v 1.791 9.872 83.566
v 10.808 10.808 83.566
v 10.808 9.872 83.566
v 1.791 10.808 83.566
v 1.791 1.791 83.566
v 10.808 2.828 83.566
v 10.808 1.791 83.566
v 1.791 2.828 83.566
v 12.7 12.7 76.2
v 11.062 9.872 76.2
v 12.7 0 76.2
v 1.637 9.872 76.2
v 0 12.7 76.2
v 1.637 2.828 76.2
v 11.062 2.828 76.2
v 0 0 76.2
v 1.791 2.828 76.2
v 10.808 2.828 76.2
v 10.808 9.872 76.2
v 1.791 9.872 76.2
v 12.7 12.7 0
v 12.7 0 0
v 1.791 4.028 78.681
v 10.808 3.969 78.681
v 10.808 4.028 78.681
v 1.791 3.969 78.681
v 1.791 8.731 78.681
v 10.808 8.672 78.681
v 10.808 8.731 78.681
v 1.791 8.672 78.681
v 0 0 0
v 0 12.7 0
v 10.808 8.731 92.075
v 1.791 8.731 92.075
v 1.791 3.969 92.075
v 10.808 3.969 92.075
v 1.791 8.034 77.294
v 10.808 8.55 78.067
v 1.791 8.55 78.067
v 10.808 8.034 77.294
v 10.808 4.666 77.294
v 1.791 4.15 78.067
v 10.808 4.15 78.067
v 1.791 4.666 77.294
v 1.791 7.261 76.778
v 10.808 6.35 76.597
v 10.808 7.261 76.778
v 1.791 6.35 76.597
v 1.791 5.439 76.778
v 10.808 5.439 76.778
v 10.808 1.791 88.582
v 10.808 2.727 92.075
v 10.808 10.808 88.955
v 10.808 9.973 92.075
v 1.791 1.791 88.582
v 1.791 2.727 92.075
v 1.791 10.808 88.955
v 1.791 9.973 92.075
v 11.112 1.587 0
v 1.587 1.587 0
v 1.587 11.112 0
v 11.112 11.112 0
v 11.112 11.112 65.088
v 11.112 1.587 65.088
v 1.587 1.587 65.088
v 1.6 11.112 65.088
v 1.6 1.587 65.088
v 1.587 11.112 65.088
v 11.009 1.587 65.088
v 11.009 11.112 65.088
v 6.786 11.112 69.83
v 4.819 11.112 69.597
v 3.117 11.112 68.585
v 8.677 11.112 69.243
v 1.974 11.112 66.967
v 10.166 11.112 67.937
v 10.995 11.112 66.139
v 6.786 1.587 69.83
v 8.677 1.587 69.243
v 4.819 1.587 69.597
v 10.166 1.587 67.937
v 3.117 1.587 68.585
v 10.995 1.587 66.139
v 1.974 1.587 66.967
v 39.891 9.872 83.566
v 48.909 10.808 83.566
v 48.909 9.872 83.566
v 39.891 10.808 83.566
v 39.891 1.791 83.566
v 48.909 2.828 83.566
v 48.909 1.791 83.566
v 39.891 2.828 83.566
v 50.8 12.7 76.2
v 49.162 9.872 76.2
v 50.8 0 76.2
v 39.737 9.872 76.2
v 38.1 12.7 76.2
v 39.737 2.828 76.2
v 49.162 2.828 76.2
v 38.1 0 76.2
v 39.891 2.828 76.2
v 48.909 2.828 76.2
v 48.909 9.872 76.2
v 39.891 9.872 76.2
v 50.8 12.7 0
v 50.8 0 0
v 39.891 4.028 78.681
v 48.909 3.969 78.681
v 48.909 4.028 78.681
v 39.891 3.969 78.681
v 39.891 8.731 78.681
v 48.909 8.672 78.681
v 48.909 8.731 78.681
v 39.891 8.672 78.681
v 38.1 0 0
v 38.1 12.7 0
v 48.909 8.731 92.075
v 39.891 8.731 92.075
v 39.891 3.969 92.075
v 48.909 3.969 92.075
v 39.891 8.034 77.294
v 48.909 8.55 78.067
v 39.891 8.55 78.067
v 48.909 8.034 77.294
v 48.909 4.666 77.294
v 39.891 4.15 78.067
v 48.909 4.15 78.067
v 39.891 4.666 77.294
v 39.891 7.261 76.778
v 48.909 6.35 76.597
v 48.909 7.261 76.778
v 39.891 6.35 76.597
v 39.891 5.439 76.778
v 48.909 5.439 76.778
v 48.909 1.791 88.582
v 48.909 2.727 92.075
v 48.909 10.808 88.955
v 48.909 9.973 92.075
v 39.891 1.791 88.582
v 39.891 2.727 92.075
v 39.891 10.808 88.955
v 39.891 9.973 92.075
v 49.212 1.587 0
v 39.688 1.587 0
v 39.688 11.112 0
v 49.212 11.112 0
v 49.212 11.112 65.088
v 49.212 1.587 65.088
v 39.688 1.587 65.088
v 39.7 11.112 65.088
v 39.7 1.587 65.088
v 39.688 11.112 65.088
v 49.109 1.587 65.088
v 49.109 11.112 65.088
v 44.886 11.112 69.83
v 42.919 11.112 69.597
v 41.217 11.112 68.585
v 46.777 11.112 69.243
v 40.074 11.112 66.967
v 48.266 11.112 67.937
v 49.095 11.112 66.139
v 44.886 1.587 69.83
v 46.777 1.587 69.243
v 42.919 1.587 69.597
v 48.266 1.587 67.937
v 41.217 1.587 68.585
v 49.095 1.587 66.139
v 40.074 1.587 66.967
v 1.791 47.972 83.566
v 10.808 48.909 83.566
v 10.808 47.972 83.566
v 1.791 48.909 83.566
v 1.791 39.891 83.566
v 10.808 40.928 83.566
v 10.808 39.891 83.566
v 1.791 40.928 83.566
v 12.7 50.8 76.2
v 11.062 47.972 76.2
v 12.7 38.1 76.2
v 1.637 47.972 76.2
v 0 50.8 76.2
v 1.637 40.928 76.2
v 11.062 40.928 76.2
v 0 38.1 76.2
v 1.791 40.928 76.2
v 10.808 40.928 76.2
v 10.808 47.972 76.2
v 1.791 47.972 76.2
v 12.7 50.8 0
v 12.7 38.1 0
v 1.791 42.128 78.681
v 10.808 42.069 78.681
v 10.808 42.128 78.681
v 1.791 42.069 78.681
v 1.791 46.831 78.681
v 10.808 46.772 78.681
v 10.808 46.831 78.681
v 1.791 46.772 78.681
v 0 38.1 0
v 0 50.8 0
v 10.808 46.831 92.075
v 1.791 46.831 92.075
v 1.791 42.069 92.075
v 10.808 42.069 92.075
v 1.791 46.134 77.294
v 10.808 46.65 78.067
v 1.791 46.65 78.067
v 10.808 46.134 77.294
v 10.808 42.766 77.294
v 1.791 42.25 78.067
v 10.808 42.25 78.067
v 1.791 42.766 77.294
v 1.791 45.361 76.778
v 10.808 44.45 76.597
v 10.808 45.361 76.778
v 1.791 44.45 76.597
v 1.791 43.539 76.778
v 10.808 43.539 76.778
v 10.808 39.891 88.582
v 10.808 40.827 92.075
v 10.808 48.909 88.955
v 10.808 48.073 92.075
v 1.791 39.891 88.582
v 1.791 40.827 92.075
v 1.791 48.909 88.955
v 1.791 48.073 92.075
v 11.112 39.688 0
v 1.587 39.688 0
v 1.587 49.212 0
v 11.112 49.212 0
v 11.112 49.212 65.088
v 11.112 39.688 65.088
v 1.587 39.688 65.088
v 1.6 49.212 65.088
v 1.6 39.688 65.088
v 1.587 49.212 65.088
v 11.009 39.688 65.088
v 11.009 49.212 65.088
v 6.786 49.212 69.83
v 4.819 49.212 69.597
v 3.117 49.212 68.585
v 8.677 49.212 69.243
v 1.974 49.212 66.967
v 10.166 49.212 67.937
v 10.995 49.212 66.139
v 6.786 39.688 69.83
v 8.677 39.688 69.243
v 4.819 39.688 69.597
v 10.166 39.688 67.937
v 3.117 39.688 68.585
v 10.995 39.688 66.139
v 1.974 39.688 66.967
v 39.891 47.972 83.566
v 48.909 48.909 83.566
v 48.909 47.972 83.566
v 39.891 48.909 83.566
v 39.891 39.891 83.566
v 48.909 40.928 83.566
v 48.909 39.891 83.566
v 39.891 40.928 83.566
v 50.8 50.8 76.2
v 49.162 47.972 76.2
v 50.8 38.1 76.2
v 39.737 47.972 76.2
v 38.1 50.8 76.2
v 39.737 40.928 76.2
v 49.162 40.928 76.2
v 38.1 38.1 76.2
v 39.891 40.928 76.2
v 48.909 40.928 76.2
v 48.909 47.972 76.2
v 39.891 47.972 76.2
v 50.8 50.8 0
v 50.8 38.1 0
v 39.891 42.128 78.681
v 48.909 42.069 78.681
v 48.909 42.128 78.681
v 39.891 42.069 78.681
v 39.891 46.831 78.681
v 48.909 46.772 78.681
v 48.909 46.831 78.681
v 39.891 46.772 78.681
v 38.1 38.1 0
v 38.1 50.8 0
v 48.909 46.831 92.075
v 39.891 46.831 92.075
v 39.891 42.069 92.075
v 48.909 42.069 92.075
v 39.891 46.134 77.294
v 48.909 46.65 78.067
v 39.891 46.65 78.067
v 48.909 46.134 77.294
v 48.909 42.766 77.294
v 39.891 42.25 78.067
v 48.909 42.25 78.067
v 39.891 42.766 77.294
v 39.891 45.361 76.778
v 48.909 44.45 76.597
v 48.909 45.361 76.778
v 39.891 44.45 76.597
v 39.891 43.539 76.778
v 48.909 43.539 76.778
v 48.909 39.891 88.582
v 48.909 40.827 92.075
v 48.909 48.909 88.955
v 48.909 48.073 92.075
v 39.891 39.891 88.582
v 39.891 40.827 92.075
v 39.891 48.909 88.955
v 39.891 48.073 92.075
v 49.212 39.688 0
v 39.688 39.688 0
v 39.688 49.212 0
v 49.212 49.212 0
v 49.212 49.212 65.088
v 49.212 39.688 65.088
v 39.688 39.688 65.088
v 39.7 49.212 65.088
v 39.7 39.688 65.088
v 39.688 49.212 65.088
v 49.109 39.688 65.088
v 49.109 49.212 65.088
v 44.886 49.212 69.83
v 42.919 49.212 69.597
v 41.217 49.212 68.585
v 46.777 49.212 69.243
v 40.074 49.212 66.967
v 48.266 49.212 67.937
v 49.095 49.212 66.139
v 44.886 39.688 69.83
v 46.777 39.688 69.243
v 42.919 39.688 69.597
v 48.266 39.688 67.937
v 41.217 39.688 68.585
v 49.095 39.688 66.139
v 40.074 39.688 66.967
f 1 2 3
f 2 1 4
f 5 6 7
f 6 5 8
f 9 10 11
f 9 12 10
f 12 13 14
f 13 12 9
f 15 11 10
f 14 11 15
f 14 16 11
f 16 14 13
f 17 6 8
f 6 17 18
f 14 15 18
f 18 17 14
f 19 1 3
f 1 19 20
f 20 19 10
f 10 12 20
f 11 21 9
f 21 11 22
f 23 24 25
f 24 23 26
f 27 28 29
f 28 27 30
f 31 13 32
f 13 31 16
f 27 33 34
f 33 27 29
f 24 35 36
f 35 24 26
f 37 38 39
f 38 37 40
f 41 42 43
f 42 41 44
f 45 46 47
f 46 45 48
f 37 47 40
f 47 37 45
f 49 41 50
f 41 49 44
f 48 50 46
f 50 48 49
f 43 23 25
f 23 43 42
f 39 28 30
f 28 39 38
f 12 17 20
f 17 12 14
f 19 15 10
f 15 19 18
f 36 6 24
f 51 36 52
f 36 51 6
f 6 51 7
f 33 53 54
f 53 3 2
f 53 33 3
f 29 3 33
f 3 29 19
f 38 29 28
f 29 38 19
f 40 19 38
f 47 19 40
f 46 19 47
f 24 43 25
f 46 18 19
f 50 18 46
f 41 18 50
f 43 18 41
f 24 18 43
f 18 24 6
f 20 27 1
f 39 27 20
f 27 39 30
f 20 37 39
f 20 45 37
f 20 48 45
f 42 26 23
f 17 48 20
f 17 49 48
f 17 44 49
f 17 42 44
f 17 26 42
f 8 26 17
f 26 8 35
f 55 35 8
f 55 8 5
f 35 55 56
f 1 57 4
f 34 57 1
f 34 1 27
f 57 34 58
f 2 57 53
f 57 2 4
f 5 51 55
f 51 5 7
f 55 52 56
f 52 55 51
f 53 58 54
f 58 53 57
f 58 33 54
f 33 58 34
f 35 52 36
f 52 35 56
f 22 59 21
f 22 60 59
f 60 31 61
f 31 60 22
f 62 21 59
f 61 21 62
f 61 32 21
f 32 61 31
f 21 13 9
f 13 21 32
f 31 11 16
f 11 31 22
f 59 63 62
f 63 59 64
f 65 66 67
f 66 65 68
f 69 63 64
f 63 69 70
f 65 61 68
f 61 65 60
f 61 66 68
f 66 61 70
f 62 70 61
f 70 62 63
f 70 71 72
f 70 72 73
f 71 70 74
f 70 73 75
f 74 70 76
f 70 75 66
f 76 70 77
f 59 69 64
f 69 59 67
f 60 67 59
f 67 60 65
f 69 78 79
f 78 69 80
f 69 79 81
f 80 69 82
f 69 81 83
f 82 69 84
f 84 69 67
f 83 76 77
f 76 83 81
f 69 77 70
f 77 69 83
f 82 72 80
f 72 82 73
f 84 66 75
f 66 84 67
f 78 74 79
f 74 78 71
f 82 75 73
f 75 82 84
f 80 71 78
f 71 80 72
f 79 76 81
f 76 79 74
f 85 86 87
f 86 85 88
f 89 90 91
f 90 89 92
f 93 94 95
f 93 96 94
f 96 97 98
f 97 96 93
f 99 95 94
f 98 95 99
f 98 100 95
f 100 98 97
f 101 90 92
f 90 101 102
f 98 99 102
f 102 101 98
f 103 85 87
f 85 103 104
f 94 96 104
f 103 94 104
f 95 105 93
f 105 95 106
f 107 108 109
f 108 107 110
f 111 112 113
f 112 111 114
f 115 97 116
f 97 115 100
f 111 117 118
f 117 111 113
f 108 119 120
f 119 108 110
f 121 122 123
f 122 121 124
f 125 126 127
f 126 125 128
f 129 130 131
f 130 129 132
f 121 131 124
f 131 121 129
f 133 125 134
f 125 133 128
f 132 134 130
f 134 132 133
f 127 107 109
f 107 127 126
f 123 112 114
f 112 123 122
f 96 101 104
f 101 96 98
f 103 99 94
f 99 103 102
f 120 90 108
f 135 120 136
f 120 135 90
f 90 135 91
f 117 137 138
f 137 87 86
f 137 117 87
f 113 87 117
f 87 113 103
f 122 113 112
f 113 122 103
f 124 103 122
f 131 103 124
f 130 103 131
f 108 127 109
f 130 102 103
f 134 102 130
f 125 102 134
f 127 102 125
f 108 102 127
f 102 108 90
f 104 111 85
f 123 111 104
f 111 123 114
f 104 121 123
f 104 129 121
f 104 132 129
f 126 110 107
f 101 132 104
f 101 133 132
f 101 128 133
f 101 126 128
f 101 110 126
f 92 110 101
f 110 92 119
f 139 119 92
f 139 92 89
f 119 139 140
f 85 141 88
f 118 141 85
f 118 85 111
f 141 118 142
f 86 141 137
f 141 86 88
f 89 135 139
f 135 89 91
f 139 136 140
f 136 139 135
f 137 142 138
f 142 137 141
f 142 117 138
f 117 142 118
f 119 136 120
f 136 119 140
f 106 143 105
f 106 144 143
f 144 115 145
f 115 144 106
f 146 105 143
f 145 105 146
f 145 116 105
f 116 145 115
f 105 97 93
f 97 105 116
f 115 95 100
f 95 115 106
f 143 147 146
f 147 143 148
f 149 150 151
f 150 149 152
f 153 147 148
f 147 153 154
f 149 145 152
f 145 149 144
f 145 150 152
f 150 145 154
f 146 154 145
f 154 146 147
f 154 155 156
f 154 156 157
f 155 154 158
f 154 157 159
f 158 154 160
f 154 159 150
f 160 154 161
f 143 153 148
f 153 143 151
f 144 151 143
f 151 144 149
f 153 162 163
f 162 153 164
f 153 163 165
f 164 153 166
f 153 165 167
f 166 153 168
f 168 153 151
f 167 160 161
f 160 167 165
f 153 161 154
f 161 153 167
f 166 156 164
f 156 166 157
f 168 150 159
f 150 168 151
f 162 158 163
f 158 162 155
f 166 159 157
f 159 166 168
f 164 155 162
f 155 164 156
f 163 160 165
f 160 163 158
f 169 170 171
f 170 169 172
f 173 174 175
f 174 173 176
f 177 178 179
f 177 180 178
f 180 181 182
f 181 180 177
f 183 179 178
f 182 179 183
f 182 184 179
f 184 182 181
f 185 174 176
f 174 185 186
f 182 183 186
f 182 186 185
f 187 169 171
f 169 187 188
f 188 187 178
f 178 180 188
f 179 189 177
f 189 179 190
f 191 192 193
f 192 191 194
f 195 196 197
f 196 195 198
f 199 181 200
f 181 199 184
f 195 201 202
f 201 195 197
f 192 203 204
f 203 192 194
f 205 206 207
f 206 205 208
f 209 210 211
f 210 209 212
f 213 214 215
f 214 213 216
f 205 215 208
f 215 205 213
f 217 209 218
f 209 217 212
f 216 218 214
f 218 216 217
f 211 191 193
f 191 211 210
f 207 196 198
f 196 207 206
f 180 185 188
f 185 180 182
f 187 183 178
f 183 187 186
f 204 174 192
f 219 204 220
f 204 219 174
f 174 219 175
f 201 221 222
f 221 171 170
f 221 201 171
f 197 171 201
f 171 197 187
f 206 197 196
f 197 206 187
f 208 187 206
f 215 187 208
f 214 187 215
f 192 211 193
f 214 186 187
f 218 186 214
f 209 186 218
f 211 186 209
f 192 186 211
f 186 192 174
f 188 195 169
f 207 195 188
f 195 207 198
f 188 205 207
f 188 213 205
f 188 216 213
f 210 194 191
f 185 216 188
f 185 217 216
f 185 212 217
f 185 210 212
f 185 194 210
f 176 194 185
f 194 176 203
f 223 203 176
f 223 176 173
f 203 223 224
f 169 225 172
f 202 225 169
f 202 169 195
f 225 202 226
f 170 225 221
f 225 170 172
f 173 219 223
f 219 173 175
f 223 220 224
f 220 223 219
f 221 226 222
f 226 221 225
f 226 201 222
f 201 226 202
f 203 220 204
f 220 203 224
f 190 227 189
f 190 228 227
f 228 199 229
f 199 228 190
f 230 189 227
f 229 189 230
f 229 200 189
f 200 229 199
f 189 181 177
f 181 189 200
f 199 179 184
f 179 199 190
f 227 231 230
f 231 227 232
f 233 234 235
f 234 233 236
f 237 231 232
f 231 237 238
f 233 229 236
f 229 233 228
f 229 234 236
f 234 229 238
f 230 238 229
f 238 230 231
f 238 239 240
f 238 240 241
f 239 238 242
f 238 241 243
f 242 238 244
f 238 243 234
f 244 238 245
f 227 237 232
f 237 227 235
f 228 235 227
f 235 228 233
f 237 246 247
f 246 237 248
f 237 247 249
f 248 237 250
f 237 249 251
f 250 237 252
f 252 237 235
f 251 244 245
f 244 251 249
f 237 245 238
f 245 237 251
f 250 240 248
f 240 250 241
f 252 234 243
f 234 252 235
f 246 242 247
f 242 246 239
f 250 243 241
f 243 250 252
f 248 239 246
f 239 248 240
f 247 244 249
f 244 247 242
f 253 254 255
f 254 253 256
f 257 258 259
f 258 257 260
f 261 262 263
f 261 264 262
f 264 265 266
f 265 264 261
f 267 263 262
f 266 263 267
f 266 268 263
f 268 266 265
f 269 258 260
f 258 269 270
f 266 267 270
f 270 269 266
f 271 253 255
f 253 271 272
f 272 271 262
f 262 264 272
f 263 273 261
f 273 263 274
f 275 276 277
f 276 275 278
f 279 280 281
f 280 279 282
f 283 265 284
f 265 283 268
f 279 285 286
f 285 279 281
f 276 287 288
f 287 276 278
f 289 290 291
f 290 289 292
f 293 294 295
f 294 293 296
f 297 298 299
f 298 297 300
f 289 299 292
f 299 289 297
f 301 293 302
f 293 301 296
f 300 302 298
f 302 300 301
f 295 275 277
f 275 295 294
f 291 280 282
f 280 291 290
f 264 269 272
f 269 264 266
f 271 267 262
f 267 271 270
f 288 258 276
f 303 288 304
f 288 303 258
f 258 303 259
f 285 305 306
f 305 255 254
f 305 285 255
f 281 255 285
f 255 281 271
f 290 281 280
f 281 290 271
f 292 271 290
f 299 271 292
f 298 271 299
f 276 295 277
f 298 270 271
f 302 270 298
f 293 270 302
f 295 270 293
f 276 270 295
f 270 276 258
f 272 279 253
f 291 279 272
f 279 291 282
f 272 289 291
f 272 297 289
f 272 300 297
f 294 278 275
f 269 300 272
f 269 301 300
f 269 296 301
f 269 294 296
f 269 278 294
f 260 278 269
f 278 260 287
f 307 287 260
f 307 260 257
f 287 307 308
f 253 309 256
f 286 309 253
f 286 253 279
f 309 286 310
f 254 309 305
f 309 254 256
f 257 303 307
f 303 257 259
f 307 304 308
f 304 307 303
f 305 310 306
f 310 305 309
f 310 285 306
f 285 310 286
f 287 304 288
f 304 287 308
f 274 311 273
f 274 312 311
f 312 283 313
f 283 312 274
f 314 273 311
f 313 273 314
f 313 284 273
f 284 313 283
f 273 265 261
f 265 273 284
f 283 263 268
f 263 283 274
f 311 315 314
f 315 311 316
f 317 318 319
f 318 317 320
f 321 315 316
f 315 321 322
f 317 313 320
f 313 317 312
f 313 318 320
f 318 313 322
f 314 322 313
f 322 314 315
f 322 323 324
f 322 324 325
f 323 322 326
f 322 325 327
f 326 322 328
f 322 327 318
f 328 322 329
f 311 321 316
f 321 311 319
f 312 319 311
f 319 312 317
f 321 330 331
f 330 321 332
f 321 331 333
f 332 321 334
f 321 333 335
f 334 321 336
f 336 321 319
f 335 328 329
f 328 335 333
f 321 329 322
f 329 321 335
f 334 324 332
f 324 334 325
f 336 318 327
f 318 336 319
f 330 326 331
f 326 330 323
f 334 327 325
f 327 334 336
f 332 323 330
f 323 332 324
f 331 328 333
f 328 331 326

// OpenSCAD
units_per_inch=25.4; // Cura takes millimeters

sixteenth_inch = units_per_inch / 16.0;
eighth_inch = units_per_inch / 8.0;
quarter_inch = units_per_inch / 4.0;
half_inch = units_per_inch / 2.0;
inch = units_per_inch / 1.0;

render_slop = .1; // Slop to make up for lack of precision in the renderer (unitless)
print_slop = 0.02*inch; // Slop to make up for oddities/meltiness during printing

leg_wd = half_inch;
leg_thickness = sixteenth_inch;
leg_hole_wd = leg_wd-(2*leg_thickness);

table_height = 3*inch;
table_thickness = quarter_inch;

total_height = table_height + table_thickness + (3*eighth_inch);

leg_cylinder_support_radius = leg_hole_wd/2;
leg_hole_height = table_height-quarter_inch-leg_cylinder_support_radius;

tab_overhang = 3*(inch/64.0);
table_hole_w = leg_wd-(2*leg_thickness);
table_hole_d = leg_wd-(2*leg_thickness)-(2*tab_overhang);

tab_band_w = leg_wd/2-table_hole_w/2;
tab_band_d = leg_wd/2-table_hole_d/2;
tab_band_h = table_thickness + print_slop;

tab_squeeze_cutout_w = 3*sixteenth_inch;
tab_squeeze_cylinder_support_radius = tab_squeeze_cutout_w/2;
tab_squeeze_total_h = total_height-table_height;
tab_squeeze_inner_h = tab_squeeze_total_h - tab_squeeze_cylinder_support_radius;

tab_squeeze_foot_h = 3*sixteenth_inch;
tab_squeeze_angle_start_h = table_height+tab_band_h+tab_squeeze_foot_h;
tab_squeeze_angle = 75.0; // degrees

module tab_band() {
  translate([-render_slop/2,-render_slop/2,table_height])
    cube([tab_band_w+render_slop,leg_wd+render_slop,tab_band_h+print_slop]);
    
  translate([leg_wd-tab_band_w-render_slop/2,-render_slop/2,table_height])
    cube([tab_band_w+render_slop,leg_wd+render_slop,tab_band_h+print_slop]);

  translate([-render_slop/2,-render_slop/2,table_height]) 
    cube([leg_wd+render_slop,tab_band_d+render_slop,tab_band_h+print_slop]);

  translate([-render_slop/2,leg_wd-tab_band_d-render_slop/2,table_height])
    cube([leg_wd+render_slop,tab_band_d+render_slop,tab_band_h+print_slop]);
}

module tab_squeeze_cutout() {
  translate([0,(leg_wd/2.0)-(tab_squeeze_cutout_w/2.0),table_height + tab_squeeze_cylinder_support_radius + render_slop]) 
    cube([leg_wd,tab_squeeze_cutout_w,tab_squeeze_inner_h]);
  
  translate([leg_wd/2,leg_wd/2,table_height + tab_squeeze_cylinder_support_radius + sixteenth_inch/4]) 
    rotate(a=[0,90,0])
    cylinder(h=leg_wd, r=tab_squeeze_cylinder_support_radius, center=true, $fn=16);
}

module tab_angle_cutouts() {
  translate([0,leg_thickness,tab_squeeze_angle_start_h]) 
    rotate([tab_squeeze_angle,0,0])
    cube([leg_wd,leg_wd,tab_squeeze_total_h]);

  translate([0,leg_wd-leg_thickness,tab_squeeze_angle_start_h])
    rotate([90-tab_squeeze_angle,0,0])
    cube([leg_wd,leg_wd,tab_squeeze_total_h]);
}

module leg_difference_tube_with_height(h) {
  translate([-render_slop/2, -render_slop/2, 0])
    difference() {
      cube([leg_wd+render_slop,leg_wd+render_slop,h]);
      
      translate([leg_thickness+print_slop/2,leg_thickness+print_slop/2,-render_slop/2])
        cube([leg_hole_wd-print_slop,leg_hole_wd-print_slop,h+render_slop]);
    }
}

module leg() {
  difference() { 
    cube([leg_wd,leg_wd,total_height]);

    // punch the hole in the leg
    translate([leg_thickness,leg_thickness,0])
      cube([leg_hole_wd,leg_hole_wd,leg_hole_height]);

    // carve the support cylinder on top so we don't need supports the whole way up
    translate([leg_wd/2, leg_wd/2, leg_hole_height])
      rotate(a=[90,11.25,0]) // 11.25 sets a vertex at the top rather than a side
      cylinder(h=leg_hole_wd, r=leg_cylinder_support_radius, center=true);

    tab_band();
    tab_squeeze_cutout();  
    translate([0,0,table_height]) leg_difference_tube_with_height(tab_squeeze_total_h+render_slop);
    tab_angle_cutouts();
  }
}

space_between_models = inch;
translate_between_models = space_between_models + leg_wd;

leg();
translate([translate_between_models, 0, 0]) leg();
translate([0, translate_between_models, 0]) leg();
translate([translate_between_models, translate_between_models, 0]) leg();
